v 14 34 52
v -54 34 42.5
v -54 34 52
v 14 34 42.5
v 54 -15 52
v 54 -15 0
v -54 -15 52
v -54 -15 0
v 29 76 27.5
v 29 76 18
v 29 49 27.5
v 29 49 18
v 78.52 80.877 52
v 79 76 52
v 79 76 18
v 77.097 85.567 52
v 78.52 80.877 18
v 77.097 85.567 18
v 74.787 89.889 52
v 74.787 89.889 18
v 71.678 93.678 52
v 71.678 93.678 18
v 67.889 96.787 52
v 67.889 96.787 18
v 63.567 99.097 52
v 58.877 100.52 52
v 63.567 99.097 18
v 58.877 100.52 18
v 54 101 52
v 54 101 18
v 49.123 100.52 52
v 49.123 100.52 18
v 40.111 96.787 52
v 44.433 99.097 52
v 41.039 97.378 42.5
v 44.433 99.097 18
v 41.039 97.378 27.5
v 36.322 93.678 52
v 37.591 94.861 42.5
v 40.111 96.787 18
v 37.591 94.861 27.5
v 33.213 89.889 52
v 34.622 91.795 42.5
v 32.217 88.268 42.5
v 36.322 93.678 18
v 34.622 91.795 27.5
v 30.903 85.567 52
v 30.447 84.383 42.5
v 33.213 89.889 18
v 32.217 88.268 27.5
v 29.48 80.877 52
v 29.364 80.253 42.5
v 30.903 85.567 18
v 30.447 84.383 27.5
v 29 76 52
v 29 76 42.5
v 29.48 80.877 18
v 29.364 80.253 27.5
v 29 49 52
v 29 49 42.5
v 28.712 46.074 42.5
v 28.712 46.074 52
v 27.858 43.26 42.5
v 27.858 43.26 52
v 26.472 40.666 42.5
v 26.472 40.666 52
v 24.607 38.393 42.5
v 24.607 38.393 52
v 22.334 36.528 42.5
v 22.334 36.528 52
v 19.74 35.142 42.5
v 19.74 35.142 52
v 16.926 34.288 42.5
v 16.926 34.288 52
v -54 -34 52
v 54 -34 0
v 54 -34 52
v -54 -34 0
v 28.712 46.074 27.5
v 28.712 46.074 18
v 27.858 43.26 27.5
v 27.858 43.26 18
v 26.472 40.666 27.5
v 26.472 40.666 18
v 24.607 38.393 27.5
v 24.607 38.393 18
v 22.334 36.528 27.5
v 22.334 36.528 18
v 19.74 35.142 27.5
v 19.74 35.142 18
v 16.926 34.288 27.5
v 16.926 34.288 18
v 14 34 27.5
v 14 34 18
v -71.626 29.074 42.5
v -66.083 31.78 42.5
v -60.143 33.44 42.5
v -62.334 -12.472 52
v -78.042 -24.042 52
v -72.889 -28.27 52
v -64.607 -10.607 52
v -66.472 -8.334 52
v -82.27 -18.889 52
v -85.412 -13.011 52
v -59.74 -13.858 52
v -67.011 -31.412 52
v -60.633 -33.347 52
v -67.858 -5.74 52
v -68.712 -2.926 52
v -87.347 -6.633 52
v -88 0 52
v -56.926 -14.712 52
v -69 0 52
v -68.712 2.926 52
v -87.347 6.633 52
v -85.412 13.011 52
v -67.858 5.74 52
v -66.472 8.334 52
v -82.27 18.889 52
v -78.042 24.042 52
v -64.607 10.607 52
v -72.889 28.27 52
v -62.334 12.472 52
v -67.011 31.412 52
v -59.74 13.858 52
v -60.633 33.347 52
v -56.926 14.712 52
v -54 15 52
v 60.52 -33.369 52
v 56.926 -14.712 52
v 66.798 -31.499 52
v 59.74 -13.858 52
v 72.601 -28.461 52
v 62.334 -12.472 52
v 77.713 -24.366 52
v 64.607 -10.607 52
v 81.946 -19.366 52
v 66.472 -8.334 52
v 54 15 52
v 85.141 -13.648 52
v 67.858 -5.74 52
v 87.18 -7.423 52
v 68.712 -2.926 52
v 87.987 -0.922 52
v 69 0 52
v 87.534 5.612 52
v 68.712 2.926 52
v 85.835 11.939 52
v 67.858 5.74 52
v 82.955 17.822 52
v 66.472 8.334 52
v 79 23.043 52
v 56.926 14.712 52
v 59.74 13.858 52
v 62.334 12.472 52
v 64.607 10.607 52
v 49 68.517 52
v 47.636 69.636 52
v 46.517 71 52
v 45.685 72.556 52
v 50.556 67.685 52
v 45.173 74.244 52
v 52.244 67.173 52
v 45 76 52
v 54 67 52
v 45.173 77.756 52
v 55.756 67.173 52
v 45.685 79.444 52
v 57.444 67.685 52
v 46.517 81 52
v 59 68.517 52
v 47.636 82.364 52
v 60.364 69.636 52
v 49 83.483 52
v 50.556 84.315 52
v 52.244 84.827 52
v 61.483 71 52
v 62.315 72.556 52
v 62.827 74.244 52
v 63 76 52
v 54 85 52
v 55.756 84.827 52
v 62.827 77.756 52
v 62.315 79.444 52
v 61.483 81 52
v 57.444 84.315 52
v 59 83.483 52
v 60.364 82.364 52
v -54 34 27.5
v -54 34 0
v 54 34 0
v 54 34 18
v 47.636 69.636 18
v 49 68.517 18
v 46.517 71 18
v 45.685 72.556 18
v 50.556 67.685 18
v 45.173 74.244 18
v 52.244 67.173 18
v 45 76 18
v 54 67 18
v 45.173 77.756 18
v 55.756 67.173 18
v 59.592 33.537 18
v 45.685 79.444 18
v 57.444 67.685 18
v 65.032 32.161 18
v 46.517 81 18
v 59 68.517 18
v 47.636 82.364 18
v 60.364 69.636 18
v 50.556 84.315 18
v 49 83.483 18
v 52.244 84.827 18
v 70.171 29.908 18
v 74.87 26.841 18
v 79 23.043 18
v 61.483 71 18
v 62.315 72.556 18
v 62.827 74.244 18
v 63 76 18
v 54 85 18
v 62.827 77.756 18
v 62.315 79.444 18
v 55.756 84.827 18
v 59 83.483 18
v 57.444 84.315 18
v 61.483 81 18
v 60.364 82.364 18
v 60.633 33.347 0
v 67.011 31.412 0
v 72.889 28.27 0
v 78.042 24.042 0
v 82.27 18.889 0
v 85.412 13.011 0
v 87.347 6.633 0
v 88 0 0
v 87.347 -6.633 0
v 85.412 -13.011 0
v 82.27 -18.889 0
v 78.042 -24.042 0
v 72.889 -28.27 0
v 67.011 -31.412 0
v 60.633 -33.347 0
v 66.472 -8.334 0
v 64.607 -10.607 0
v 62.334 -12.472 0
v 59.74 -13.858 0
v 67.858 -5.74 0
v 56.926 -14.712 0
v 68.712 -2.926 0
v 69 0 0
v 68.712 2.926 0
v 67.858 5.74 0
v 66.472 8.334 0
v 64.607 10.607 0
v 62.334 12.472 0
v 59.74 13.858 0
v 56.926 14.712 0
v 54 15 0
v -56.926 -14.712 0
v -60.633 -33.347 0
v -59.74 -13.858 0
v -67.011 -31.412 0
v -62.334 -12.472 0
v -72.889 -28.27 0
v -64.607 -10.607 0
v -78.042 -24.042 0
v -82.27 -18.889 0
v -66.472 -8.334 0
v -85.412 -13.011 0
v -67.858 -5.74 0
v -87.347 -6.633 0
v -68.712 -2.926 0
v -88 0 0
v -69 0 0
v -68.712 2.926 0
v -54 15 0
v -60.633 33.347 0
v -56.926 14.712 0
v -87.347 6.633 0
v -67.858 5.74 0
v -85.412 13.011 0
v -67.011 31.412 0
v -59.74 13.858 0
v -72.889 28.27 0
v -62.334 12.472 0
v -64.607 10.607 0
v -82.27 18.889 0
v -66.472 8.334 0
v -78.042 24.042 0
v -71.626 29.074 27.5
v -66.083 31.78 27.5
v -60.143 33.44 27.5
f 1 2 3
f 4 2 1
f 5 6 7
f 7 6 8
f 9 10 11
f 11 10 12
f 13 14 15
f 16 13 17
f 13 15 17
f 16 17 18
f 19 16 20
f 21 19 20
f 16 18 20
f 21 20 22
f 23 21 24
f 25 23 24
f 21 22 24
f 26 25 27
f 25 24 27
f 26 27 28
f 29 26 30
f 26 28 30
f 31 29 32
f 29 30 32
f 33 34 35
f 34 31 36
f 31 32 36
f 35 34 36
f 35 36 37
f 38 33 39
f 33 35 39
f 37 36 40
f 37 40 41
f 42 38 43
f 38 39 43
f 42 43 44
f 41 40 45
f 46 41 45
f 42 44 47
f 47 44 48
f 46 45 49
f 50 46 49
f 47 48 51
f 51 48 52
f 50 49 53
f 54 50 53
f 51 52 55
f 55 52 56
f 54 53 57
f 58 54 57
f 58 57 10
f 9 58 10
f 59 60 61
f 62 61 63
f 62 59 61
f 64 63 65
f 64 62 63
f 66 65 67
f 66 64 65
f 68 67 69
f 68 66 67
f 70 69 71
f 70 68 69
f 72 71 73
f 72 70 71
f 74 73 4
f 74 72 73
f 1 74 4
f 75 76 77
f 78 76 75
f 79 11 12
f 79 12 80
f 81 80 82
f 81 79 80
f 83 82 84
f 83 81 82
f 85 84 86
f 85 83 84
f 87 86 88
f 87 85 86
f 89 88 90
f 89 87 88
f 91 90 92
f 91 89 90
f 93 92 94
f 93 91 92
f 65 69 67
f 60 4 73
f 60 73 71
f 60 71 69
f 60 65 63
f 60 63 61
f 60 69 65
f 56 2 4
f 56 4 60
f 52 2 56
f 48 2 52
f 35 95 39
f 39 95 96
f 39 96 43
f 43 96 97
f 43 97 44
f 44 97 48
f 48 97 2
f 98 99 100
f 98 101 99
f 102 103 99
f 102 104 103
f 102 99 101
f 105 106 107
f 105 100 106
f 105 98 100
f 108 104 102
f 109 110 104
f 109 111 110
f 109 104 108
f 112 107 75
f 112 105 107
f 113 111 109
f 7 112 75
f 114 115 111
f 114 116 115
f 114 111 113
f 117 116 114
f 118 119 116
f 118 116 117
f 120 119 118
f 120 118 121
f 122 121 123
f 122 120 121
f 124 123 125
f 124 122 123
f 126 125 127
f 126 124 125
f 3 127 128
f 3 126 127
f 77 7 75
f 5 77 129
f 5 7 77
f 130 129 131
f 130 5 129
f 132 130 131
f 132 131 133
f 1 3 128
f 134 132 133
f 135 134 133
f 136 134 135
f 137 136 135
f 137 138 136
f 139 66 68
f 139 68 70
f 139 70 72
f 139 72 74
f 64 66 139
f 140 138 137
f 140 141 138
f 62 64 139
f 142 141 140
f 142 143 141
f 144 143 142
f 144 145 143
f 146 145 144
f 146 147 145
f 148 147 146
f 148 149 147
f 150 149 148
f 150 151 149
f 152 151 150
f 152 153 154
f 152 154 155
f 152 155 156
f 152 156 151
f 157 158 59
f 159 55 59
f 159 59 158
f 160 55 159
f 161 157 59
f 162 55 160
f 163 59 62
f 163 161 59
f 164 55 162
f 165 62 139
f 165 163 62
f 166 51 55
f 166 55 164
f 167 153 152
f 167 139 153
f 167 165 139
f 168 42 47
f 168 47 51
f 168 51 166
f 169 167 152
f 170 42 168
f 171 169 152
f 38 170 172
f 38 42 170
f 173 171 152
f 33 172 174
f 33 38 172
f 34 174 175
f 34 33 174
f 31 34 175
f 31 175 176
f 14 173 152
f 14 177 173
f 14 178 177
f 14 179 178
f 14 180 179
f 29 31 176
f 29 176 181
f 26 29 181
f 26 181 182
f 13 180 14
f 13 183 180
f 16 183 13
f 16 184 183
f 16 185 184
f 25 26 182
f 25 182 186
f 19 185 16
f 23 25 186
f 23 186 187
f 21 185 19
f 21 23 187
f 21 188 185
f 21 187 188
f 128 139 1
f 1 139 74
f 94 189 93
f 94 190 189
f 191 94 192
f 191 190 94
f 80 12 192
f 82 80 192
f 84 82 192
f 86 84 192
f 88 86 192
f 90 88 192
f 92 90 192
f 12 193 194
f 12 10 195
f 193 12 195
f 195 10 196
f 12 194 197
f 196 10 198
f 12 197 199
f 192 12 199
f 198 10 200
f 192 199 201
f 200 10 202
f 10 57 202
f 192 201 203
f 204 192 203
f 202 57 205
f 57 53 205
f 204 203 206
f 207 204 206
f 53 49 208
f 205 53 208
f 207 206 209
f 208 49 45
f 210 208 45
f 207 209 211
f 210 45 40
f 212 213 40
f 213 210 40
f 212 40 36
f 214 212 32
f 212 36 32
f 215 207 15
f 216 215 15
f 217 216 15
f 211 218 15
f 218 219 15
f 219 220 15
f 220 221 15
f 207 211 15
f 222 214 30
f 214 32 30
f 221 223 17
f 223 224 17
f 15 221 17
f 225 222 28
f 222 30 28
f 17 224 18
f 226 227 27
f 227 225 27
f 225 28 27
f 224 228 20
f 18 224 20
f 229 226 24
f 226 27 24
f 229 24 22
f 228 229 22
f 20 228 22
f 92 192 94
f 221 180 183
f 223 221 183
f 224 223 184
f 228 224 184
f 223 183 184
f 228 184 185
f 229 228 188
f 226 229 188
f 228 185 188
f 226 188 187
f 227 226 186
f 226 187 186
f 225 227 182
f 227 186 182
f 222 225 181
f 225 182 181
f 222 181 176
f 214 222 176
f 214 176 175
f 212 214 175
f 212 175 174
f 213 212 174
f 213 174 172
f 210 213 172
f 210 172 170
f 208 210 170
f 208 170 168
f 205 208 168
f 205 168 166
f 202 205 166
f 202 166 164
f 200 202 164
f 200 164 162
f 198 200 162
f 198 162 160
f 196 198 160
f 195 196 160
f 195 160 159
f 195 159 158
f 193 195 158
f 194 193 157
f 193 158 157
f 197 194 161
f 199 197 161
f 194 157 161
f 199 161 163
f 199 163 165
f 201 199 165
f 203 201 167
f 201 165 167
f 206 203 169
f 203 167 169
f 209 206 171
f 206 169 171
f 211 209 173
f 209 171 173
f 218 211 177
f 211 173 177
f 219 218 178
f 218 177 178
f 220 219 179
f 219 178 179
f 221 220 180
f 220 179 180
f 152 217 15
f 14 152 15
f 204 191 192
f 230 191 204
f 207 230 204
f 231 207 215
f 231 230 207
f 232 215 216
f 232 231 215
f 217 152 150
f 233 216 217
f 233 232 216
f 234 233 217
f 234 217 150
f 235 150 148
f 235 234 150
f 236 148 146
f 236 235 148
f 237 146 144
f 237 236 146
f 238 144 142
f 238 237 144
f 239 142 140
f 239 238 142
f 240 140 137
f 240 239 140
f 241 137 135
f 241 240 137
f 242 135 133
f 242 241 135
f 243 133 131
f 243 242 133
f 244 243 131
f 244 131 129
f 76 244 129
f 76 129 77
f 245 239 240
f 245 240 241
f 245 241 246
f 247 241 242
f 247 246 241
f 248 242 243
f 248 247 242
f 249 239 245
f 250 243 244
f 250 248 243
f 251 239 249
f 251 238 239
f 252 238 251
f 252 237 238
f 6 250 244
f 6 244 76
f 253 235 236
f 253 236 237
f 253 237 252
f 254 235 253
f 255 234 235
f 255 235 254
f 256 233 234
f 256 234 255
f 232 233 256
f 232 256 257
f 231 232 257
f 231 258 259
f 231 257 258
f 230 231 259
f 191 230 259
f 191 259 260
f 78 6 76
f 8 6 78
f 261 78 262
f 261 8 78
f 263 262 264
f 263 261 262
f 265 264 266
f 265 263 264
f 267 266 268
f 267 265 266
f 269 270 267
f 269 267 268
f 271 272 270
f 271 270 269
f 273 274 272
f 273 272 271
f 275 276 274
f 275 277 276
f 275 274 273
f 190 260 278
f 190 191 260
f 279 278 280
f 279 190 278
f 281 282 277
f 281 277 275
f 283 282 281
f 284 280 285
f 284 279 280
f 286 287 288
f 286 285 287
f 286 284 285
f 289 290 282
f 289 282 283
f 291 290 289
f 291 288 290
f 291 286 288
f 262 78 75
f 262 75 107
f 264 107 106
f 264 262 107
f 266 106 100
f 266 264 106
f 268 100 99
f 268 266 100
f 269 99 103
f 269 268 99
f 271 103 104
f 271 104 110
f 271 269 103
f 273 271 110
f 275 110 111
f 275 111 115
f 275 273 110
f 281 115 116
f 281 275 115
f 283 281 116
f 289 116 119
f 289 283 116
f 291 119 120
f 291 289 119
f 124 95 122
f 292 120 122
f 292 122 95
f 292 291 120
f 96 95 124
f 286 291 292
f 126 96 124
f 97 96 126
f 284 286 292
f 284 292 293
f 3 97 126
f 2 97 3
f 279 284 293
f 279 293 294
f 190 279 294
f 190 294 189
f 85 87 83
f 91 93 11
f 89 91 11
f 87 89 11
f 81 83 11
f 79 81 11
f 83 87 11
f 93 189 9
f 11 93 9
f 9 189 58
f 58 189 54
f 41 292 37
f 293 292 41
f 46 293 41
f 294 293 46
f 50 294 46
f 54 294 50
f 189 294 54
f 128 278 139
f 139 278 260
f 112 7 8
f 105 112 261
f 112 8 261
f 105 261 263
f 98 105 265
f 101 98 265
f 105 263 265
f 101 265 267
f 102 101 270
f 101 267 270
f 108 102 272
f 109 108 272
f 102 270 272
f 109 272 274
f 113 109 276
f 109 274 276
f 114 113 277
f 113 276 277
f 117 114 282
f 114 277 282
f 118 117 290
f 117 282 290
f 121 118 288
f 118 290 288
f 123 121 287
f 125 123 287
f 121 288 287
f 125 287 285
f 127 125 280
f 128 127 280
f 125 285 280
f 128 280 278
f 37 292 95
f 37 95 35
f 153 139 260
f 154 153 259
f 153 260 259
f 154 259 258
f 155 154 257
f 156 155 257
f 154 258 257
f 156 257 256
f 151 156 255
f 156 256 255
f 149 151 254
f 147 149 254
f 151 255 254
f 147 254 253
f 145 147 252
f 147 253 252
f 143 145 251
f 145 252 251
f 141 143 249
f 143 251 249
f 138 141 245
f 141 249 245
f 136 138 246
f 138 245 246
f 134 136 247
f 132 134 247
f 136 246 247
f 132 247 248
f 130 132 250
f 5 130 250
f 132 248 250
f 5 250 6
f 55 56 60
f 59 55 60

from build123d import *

# Parameters (mm, degrees)
BOSS_EXTRUDE1_DEPTH = 52
BOSS_EXTRUDE2_START = -34
BOSS_EXTRUDE2_DEPTH = 34
SKETCH2_3_R         = 9
CUT_EXTRUDE2_DEPTH  = 144.697599145
FILLET1_R           = 15
RIB3_REACH          = 140.456
SKETCH4_WALL_W      = 410.665096048
SKETCH4_WALL_H      = 15


with BuildPart() as part:
    # Sketch1 → Boss-Extrude1 (new body)
    with BuildSketch(Plane.XY):
        with BuildLine():
            Line((-54, 34), (54, 34))
            ThreePointArc((54, 34), (88, 0), (54, -34))
            Line((54, -34), (-54, -34))
            ThreePointArc((-54, -34), (-88, 0), (-54, 34))
        make_face()
        with BuildLine():
            Line((-54, 15), (54, 15))
            ThreePointArc((54, 15), (69, 0), (54, -15))
            Line((54, -15), (-54, -15))
            ThreePointArc((-54, -15), (-69, 0), (-54, 15))
        make_face(mode=Mode.SUBTRACT)
    extrude(amount=BOSS_EXTRUDE1_DEPTH)

    # Sketch2 → Boss-Extrude2 (add)
    with BuildSketch(Plane.XY.offset(52).offset(BOSS_EXTRUDE2_START)):
        with BuildLine():
            Line((29, 76), (29, 34))
            Line((29, 34), (54, 34))
            ThreePointArc((54, 34), (67.647767834, 31.140623519), (79, 23.043437244))
            Line((79, 23.043437244), (79, 76))
            ThreePointArc((79, 76), (54, 101), (29, 76))
        make_face()
    extrude(amount=BOSS_EXTRUDE2_DEPTH)

    # Sketch2<3> → Cut-Extrude2 (cut, through all)
    with BuildSketch(Plane.XY.offset(52)):
        with Locations((54, 76)):
            Circle(SKETCH2_3_R)
    extrude(amount=-CUT_EXTRUDE2_DEPTH, mode=Mode.SUBTRACT)

    # Fillet1
    fillet1_edges = [part.edges().sort_by_distance(p)[0] for p in [
        (29, 34, 35),
    ]]
    fillet(fillet1_edges, radius=FILLET1_R)

    # Sketch4 wall → Rib3 (add, up to next)
    with BuildSketch(Plane(origin=(-15.293433294, 63.226194681, 35), x_dir=(0.855125243419, 0.518421467599, 0), z_dir=(-0.518421467599, 0.855125243419, 0)), mode=Mode.PRIVATE) as rib3_sk1:
        Rectangle(SKETCH4_WALL_W, SKETCH4_WALL_H)
    rib3_tool1 = extrude(rib3_sk1.sketch, amount=-RIB3_REACH, mode=Mode.PRIVATE) - part.part
    add(rib3_tool1.solids().sort_by_distance((-15.293433294, 63.226194681, 35))[0])


solid = part.part
